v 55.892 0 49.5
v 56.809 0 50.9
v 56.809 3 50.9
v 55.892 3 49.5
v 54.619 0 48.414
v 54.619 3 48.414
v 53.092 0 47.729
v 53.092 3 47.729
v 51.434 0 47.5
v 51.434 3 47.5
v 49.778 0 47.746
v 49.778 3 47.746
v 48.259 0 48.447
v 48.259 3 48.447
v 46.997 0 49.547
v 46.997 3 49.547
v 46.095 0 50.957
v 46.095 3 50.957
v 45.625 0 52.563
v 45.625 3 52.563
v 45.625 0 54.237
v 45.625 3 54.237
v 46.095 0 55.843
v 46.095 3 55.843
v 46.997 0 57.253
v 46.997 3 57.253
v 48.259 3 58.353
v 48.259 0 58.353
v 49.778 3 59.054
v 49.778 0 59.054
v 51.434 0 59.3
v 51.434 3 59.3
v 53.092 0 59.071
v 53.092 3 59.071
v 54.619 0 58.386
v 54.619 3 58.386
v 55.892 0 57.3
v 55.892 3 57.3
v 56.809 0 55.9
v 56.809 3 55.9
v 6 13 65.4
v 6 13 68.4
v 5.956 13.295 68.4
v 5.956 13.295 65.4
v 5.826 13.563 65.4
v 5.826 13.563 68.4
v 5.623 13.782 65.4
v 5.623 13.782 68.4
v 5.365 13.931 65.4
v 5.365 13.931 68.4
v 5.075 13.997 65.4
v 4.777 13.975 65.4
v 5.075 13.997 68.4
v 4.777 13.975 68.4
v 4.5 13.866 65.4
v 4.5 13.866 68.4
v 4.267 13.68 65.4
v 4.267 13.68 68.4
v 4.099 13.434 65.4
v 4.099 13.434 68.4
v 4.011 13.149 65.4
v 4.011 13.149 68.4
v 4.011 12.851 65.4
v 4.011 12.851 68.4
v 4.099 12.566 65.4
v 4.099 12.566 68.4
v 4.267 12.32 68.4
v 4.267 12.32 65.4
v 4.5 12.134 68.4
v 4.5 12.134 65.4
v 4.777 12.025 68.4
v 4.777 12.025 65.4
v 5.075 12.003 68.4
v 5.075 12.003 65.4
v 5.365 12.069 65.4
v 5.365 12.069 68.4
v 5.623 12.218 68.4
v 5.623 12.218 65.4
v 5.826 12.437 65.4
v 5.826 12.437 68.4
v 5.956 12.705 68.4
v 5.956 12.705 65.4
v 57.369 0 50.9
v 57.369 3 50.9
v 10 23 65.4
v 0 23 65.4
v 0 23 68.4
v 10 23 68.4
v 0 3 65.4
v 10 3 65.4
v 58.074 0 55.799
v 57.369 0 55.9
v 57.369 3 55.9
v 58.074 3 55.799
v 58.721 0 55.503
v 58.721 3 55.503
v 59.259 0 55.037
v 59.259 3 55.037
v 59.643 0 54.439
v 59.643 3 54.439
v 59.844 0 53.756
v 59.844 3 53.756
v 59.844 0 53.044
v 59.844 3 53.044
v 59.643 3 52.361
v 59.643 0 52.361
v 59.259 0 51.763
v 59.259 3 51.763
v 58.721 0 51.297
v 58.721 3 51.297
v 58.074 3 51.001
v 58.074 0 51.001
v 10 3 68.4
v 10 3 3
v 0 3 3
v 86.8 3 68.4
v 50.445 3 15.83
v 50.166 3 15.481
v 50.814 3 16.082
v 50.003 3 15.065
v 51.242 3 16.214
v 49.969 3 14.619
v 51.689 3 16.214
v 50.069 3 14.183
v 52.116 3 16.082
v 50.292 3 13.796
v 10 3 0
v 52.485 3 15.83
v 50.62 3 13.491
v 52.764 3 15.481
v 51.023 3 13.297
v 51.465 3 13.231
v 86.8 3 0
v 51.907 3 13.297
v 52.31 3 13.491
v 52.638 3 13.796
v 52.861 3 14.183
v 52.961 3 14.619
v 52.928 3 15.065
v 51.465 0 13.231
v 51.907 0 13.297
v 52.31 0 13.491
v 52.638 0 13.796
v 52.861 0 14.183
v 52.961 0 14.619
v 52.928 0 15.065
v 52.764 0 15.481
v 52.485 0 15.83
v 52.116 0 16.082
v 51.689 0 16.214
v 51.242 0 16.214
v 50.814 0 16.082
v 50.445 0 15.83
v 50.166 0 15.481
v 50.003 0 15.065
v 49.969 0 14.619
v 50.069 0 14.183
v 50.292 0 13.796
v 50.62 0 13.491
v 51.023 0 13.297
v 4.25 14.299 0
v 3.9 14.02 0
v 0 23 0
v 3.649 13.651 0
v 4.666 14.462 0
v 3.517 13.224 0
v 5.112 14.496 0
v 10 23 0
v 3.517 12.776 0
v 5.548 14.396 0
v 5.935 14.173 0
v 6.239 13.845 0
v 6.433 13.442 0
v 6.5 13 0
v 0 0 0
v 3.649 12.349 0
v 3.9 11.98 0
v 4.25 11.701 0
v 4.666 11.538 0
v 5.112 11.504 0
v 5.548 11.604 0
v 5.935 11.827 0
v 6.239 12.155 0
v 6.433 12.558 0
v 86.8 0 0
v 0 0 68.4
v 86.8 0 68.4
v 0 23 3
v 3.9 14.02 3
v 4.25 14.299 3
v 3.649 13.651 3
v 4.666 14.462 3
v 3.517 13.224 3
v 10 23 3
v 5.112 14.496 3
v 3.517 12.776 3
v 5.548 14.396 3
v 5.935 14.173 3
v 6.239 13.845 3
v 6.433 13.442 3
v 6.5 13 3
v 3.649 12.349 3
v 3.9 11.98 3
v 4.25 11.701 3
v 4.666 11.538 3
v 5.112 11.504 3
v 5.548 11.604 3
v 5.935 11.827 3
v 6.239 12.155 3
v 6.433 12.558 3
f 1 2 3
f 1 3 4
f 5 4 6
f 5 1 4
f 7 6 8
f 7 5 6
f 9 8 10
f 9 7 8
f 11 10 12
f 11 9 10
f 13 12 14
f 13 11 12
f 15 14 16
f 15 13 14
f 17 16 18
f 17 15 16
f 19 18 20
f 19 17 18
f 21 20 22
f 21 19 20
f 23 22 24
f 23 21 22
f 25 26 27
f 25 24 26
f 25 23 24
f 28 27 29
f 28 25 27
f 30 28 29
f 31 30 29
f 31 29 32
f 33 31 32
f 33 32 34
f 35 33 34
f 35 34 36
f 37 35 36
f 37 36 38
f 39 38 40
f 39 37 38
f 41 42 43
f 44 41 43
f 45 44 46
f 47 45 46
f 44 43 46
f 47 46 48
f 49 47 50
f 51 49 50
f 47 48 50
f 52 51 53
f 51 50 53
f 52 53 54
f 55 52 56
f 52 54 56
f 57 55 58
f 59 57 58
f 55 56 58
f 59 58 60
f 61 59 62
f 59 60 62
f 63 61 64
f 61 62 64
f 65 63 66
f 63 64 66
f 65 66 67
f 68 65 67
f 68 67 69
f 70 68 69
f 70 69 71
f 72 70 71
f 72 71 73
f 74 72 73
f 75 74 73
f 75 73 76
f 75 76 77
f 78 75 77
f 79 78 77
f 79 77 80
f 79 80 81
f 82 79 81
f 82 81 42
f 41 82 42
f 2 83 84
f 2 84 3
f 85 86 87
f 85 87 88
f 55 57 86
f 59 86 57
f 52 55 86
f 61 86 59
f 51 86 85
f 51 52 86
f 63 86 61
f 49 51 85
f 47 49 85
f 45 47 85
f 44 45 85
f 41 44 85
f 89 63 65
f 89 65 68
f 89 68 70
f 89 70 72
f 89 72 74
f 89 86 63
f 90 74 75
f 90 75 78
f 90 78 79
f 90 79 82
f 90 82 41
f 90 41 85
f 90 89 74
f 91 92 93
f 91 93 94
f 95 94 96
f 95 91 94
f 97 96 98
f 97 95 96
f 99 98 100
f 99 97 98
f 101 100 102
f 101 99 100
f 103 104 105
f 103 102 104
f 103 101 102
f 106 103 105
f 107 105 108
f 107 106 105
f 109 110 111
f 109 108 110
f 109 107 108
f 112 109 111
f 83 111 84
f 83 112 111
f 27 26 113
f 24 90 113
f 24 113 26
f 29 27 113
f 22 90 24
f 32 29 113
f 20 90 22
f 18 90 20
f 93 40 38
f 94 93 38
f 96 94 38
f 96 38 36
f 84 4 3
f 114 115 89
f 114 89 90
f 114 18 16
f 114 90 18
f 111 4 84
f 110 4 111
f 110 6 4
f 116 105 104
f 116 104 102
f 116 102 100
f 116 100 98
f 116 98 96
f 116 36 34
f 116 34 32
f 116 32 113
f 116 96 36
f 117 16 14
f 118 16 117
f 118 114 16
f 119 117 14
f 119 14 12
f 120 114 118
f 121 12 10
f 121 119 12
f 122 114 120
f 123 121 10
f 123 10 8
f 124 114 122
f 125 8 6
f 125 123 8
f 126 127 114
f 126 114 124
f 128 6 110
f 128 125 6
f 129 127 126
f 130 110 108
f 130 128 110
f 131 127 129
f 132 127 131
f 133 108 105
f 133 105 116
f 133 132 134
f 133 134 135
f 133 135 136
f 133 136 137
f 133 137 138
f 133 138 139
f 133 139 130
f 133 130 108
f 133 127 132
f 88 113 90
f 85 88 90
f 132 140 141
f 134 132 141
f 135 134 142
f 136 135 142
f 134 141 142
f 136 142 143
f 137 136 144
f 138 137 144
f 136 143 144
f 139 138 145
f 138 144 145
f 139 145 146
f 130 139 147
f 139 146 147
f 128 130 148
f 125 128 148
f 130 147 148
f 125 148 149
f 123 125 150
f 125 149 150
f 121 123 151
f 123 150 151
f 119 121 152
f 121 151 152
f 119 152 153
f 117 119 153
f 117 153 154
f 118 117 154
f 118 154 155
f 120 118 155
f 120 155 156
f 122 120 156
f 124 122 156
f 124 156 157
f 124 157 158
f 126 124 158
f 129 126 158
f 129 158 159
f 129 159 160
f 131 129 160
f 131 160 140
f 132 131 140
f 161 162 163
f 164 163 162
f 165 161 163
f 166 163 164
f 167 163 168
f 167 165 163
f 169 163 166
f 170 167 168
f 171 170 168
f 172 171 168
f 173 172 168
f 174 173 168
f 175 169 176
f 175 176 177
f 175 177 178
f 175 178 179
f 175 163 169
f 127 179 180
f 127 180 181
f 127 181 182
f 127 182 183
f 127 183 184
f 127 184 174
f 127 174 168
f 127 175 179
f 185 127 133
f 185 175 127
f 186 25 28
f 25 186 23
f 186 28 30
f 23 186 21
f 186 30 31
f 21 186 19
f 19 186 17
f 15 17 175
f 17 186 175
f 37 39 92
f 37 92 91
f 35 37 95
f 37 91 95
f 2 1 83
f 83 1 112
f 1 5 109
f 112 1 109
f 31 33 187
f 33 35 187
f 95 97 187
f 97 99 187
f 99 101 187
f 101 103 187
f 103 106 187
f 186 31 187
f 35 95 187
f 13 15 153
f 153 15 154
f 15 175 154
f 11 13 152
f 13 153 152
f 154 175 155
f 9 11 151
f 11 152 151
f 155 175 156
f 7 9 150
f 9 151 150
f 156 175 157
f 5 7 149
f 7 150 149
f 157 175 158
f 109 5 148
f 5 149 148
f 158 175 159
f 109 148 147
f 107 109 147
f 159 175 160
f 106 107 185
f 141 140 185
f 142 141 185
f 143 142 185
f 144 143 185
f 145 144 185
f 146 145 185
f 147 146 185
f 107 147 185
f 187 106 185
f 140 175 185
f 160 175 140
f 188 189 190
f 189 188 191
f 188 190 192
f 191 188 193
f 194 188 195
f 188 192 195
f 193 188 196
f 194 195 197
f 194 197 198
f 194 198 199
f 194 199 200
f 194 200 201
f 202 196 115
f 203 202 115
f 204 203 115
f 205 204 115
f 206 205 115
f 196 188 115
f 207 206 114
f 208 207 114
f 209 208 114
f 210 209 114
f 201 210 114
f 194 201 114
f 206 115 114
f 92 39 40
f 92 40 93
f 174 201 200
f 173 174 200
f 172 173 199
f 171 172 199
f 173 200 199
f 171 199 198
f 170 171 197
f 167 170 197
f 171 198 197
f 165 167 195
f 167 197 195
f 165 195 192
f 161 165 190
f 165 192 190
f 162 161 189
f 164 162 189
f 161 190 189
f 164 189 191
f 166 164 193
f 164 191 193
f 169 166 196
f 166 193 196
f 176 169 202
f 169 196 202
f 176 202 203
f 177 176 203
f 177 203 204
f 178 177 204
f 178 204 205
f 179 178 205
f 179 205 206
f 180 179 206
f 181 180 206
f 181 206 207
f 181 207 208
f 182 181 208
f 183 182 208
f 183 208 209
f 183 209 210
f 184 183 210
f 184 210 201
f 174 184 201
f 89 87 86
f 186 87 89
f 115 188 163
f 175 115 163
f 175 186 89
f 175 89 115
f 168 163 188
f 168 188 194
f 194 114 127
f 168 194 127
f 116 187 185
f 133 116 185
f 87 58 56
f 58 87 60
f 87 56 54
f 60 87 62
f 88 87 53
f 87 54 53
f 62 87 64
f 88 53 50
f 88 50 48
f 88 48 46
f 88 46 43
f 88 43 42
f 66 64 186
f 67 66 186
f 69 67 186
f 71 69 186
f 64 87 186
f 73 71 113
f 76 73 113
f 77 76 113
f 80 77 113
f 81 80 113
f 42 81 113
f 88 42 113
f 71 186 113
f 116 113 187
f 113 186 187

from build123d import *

# Parameters (mm, degrees)
SKETCH1_W           = 86.8
SKETCH1_H           = 68.4
BOSS_EXTRUDE1_DEPTH = 3
SKETCH2_W           = 10
SKETCH2_H           = 3
BOSS_EXTRUDE2_DEPTH = 20
SKETCH3_W           = 10
SKETCH3_H           = 3
BOSS_EXTRUDE3_DEPTH = 20
SKETCH4_R           = 1
CUT_EXTRUDE1_DEPTH  = 20
SKETCH5_R           = 1.5
CUT_EXTRUDE2_DEPTH  = 20
SKETCH8_R           = 1.5
CUT_EXTRUDE3_DEPTH  = 20
CUT_EXTRUDE4_DEPTH  = 10


with BuildPart() as part:
    # Sketch1 → Boss-Extrude1 (new body)
    with BuildSketch(Plane(origin=(0, 0, 0), x_dir=(1, 0, 0), z_dir=(0, 1, 0))):
        with Locations((43.4, -34.2)):
            Rectangle(SKETCH1_W, SKETCH1_H)
    extrude(amount=BOSS_EXTRUDE1_DEPTH)

    # Sketch2 → Boss-Extrude2 (add)
    with BuildSketch(Plane(origin=(0, 3, 0), x_dir=(1, 0, 0), z_dir=(0, 1, 0))):
        with Locations((5, -66.9)):
            Rectangle(SKETCH2_W, SKETCH2_H)
    extrude(amount=BOSS_EXTRUDE2_DEPTH)

    # Sketch3 → Boss-Extrude3 (add)
    with BuildSketch(Plane(origin=(0, 3, 0), x_dir=(1, 0, 0), z_dir=(0, 1, 0))):
        with Locations((5, -1.5)):
            Rectangle(SKETCH3_W, SKETCH3_H)
    extrude(amount=BOSS_EXTRUDE3_DEPTH)

    # Sketch4 → Cut-Extrude1 (cut)
    with BuildSketch(Plane.XY.offset(68.4)):
        with Locations((5, 13)):
            Circle(SKETCH4_R)
    extrude(amount=-CUT_EXTRUDE1_DEPTH, mode=Mode.SUBTRACT)

    # Sketch5 → Cut-Extrude2 (cut)
    with BuildSketch(Plane.XY.offset(3)):
        with Locations((5, 13)):
            Circle(SKETCH5_R)
    extrude(amount=-CUT_EXTRUDE2_DEPTH, mode=Mode.SUBTRACT)

    # Sketch8 → Cut-Extrude3 (cut)
    with BuildSketch(Plane.XZ):
        with Locations(Location((51.465174946, 53.4, 0), (0, 0, 270))):
            Circle(SKETCH8_R)
        with Locations(Location((51.465174946, 14.730831909, 0), (0, 0, 270))):
            Circle(SKETCH8_R)
    extrude(amount=-CUT_EXTRUDE3_DEPTH, mode=Mode.SUBTRACT)

    # Sketch9 → Cut-Extrude4 (cut)
    with BuildSketch(Plane.XZ):
        with BuildLine():
            Line((56.809330632, 55.9), (57.369330632, 55.9))
            ThreePointArc((57.369330632, 55.9), (59.869330632, 53.4), (57.369330632, 50.9))
            Line((57.369330632, 50.9), (56.809330632, 50.9))
            ThreePointArc((56.809330632, 50.9), (45.565174946, 53.4), (56.809330632, 55.9))
        make_face()
    extrude(amount=-CUT_EXTRUDE4_DEPTH, mode=Mode.SUBTRACT)


solid = part.part
